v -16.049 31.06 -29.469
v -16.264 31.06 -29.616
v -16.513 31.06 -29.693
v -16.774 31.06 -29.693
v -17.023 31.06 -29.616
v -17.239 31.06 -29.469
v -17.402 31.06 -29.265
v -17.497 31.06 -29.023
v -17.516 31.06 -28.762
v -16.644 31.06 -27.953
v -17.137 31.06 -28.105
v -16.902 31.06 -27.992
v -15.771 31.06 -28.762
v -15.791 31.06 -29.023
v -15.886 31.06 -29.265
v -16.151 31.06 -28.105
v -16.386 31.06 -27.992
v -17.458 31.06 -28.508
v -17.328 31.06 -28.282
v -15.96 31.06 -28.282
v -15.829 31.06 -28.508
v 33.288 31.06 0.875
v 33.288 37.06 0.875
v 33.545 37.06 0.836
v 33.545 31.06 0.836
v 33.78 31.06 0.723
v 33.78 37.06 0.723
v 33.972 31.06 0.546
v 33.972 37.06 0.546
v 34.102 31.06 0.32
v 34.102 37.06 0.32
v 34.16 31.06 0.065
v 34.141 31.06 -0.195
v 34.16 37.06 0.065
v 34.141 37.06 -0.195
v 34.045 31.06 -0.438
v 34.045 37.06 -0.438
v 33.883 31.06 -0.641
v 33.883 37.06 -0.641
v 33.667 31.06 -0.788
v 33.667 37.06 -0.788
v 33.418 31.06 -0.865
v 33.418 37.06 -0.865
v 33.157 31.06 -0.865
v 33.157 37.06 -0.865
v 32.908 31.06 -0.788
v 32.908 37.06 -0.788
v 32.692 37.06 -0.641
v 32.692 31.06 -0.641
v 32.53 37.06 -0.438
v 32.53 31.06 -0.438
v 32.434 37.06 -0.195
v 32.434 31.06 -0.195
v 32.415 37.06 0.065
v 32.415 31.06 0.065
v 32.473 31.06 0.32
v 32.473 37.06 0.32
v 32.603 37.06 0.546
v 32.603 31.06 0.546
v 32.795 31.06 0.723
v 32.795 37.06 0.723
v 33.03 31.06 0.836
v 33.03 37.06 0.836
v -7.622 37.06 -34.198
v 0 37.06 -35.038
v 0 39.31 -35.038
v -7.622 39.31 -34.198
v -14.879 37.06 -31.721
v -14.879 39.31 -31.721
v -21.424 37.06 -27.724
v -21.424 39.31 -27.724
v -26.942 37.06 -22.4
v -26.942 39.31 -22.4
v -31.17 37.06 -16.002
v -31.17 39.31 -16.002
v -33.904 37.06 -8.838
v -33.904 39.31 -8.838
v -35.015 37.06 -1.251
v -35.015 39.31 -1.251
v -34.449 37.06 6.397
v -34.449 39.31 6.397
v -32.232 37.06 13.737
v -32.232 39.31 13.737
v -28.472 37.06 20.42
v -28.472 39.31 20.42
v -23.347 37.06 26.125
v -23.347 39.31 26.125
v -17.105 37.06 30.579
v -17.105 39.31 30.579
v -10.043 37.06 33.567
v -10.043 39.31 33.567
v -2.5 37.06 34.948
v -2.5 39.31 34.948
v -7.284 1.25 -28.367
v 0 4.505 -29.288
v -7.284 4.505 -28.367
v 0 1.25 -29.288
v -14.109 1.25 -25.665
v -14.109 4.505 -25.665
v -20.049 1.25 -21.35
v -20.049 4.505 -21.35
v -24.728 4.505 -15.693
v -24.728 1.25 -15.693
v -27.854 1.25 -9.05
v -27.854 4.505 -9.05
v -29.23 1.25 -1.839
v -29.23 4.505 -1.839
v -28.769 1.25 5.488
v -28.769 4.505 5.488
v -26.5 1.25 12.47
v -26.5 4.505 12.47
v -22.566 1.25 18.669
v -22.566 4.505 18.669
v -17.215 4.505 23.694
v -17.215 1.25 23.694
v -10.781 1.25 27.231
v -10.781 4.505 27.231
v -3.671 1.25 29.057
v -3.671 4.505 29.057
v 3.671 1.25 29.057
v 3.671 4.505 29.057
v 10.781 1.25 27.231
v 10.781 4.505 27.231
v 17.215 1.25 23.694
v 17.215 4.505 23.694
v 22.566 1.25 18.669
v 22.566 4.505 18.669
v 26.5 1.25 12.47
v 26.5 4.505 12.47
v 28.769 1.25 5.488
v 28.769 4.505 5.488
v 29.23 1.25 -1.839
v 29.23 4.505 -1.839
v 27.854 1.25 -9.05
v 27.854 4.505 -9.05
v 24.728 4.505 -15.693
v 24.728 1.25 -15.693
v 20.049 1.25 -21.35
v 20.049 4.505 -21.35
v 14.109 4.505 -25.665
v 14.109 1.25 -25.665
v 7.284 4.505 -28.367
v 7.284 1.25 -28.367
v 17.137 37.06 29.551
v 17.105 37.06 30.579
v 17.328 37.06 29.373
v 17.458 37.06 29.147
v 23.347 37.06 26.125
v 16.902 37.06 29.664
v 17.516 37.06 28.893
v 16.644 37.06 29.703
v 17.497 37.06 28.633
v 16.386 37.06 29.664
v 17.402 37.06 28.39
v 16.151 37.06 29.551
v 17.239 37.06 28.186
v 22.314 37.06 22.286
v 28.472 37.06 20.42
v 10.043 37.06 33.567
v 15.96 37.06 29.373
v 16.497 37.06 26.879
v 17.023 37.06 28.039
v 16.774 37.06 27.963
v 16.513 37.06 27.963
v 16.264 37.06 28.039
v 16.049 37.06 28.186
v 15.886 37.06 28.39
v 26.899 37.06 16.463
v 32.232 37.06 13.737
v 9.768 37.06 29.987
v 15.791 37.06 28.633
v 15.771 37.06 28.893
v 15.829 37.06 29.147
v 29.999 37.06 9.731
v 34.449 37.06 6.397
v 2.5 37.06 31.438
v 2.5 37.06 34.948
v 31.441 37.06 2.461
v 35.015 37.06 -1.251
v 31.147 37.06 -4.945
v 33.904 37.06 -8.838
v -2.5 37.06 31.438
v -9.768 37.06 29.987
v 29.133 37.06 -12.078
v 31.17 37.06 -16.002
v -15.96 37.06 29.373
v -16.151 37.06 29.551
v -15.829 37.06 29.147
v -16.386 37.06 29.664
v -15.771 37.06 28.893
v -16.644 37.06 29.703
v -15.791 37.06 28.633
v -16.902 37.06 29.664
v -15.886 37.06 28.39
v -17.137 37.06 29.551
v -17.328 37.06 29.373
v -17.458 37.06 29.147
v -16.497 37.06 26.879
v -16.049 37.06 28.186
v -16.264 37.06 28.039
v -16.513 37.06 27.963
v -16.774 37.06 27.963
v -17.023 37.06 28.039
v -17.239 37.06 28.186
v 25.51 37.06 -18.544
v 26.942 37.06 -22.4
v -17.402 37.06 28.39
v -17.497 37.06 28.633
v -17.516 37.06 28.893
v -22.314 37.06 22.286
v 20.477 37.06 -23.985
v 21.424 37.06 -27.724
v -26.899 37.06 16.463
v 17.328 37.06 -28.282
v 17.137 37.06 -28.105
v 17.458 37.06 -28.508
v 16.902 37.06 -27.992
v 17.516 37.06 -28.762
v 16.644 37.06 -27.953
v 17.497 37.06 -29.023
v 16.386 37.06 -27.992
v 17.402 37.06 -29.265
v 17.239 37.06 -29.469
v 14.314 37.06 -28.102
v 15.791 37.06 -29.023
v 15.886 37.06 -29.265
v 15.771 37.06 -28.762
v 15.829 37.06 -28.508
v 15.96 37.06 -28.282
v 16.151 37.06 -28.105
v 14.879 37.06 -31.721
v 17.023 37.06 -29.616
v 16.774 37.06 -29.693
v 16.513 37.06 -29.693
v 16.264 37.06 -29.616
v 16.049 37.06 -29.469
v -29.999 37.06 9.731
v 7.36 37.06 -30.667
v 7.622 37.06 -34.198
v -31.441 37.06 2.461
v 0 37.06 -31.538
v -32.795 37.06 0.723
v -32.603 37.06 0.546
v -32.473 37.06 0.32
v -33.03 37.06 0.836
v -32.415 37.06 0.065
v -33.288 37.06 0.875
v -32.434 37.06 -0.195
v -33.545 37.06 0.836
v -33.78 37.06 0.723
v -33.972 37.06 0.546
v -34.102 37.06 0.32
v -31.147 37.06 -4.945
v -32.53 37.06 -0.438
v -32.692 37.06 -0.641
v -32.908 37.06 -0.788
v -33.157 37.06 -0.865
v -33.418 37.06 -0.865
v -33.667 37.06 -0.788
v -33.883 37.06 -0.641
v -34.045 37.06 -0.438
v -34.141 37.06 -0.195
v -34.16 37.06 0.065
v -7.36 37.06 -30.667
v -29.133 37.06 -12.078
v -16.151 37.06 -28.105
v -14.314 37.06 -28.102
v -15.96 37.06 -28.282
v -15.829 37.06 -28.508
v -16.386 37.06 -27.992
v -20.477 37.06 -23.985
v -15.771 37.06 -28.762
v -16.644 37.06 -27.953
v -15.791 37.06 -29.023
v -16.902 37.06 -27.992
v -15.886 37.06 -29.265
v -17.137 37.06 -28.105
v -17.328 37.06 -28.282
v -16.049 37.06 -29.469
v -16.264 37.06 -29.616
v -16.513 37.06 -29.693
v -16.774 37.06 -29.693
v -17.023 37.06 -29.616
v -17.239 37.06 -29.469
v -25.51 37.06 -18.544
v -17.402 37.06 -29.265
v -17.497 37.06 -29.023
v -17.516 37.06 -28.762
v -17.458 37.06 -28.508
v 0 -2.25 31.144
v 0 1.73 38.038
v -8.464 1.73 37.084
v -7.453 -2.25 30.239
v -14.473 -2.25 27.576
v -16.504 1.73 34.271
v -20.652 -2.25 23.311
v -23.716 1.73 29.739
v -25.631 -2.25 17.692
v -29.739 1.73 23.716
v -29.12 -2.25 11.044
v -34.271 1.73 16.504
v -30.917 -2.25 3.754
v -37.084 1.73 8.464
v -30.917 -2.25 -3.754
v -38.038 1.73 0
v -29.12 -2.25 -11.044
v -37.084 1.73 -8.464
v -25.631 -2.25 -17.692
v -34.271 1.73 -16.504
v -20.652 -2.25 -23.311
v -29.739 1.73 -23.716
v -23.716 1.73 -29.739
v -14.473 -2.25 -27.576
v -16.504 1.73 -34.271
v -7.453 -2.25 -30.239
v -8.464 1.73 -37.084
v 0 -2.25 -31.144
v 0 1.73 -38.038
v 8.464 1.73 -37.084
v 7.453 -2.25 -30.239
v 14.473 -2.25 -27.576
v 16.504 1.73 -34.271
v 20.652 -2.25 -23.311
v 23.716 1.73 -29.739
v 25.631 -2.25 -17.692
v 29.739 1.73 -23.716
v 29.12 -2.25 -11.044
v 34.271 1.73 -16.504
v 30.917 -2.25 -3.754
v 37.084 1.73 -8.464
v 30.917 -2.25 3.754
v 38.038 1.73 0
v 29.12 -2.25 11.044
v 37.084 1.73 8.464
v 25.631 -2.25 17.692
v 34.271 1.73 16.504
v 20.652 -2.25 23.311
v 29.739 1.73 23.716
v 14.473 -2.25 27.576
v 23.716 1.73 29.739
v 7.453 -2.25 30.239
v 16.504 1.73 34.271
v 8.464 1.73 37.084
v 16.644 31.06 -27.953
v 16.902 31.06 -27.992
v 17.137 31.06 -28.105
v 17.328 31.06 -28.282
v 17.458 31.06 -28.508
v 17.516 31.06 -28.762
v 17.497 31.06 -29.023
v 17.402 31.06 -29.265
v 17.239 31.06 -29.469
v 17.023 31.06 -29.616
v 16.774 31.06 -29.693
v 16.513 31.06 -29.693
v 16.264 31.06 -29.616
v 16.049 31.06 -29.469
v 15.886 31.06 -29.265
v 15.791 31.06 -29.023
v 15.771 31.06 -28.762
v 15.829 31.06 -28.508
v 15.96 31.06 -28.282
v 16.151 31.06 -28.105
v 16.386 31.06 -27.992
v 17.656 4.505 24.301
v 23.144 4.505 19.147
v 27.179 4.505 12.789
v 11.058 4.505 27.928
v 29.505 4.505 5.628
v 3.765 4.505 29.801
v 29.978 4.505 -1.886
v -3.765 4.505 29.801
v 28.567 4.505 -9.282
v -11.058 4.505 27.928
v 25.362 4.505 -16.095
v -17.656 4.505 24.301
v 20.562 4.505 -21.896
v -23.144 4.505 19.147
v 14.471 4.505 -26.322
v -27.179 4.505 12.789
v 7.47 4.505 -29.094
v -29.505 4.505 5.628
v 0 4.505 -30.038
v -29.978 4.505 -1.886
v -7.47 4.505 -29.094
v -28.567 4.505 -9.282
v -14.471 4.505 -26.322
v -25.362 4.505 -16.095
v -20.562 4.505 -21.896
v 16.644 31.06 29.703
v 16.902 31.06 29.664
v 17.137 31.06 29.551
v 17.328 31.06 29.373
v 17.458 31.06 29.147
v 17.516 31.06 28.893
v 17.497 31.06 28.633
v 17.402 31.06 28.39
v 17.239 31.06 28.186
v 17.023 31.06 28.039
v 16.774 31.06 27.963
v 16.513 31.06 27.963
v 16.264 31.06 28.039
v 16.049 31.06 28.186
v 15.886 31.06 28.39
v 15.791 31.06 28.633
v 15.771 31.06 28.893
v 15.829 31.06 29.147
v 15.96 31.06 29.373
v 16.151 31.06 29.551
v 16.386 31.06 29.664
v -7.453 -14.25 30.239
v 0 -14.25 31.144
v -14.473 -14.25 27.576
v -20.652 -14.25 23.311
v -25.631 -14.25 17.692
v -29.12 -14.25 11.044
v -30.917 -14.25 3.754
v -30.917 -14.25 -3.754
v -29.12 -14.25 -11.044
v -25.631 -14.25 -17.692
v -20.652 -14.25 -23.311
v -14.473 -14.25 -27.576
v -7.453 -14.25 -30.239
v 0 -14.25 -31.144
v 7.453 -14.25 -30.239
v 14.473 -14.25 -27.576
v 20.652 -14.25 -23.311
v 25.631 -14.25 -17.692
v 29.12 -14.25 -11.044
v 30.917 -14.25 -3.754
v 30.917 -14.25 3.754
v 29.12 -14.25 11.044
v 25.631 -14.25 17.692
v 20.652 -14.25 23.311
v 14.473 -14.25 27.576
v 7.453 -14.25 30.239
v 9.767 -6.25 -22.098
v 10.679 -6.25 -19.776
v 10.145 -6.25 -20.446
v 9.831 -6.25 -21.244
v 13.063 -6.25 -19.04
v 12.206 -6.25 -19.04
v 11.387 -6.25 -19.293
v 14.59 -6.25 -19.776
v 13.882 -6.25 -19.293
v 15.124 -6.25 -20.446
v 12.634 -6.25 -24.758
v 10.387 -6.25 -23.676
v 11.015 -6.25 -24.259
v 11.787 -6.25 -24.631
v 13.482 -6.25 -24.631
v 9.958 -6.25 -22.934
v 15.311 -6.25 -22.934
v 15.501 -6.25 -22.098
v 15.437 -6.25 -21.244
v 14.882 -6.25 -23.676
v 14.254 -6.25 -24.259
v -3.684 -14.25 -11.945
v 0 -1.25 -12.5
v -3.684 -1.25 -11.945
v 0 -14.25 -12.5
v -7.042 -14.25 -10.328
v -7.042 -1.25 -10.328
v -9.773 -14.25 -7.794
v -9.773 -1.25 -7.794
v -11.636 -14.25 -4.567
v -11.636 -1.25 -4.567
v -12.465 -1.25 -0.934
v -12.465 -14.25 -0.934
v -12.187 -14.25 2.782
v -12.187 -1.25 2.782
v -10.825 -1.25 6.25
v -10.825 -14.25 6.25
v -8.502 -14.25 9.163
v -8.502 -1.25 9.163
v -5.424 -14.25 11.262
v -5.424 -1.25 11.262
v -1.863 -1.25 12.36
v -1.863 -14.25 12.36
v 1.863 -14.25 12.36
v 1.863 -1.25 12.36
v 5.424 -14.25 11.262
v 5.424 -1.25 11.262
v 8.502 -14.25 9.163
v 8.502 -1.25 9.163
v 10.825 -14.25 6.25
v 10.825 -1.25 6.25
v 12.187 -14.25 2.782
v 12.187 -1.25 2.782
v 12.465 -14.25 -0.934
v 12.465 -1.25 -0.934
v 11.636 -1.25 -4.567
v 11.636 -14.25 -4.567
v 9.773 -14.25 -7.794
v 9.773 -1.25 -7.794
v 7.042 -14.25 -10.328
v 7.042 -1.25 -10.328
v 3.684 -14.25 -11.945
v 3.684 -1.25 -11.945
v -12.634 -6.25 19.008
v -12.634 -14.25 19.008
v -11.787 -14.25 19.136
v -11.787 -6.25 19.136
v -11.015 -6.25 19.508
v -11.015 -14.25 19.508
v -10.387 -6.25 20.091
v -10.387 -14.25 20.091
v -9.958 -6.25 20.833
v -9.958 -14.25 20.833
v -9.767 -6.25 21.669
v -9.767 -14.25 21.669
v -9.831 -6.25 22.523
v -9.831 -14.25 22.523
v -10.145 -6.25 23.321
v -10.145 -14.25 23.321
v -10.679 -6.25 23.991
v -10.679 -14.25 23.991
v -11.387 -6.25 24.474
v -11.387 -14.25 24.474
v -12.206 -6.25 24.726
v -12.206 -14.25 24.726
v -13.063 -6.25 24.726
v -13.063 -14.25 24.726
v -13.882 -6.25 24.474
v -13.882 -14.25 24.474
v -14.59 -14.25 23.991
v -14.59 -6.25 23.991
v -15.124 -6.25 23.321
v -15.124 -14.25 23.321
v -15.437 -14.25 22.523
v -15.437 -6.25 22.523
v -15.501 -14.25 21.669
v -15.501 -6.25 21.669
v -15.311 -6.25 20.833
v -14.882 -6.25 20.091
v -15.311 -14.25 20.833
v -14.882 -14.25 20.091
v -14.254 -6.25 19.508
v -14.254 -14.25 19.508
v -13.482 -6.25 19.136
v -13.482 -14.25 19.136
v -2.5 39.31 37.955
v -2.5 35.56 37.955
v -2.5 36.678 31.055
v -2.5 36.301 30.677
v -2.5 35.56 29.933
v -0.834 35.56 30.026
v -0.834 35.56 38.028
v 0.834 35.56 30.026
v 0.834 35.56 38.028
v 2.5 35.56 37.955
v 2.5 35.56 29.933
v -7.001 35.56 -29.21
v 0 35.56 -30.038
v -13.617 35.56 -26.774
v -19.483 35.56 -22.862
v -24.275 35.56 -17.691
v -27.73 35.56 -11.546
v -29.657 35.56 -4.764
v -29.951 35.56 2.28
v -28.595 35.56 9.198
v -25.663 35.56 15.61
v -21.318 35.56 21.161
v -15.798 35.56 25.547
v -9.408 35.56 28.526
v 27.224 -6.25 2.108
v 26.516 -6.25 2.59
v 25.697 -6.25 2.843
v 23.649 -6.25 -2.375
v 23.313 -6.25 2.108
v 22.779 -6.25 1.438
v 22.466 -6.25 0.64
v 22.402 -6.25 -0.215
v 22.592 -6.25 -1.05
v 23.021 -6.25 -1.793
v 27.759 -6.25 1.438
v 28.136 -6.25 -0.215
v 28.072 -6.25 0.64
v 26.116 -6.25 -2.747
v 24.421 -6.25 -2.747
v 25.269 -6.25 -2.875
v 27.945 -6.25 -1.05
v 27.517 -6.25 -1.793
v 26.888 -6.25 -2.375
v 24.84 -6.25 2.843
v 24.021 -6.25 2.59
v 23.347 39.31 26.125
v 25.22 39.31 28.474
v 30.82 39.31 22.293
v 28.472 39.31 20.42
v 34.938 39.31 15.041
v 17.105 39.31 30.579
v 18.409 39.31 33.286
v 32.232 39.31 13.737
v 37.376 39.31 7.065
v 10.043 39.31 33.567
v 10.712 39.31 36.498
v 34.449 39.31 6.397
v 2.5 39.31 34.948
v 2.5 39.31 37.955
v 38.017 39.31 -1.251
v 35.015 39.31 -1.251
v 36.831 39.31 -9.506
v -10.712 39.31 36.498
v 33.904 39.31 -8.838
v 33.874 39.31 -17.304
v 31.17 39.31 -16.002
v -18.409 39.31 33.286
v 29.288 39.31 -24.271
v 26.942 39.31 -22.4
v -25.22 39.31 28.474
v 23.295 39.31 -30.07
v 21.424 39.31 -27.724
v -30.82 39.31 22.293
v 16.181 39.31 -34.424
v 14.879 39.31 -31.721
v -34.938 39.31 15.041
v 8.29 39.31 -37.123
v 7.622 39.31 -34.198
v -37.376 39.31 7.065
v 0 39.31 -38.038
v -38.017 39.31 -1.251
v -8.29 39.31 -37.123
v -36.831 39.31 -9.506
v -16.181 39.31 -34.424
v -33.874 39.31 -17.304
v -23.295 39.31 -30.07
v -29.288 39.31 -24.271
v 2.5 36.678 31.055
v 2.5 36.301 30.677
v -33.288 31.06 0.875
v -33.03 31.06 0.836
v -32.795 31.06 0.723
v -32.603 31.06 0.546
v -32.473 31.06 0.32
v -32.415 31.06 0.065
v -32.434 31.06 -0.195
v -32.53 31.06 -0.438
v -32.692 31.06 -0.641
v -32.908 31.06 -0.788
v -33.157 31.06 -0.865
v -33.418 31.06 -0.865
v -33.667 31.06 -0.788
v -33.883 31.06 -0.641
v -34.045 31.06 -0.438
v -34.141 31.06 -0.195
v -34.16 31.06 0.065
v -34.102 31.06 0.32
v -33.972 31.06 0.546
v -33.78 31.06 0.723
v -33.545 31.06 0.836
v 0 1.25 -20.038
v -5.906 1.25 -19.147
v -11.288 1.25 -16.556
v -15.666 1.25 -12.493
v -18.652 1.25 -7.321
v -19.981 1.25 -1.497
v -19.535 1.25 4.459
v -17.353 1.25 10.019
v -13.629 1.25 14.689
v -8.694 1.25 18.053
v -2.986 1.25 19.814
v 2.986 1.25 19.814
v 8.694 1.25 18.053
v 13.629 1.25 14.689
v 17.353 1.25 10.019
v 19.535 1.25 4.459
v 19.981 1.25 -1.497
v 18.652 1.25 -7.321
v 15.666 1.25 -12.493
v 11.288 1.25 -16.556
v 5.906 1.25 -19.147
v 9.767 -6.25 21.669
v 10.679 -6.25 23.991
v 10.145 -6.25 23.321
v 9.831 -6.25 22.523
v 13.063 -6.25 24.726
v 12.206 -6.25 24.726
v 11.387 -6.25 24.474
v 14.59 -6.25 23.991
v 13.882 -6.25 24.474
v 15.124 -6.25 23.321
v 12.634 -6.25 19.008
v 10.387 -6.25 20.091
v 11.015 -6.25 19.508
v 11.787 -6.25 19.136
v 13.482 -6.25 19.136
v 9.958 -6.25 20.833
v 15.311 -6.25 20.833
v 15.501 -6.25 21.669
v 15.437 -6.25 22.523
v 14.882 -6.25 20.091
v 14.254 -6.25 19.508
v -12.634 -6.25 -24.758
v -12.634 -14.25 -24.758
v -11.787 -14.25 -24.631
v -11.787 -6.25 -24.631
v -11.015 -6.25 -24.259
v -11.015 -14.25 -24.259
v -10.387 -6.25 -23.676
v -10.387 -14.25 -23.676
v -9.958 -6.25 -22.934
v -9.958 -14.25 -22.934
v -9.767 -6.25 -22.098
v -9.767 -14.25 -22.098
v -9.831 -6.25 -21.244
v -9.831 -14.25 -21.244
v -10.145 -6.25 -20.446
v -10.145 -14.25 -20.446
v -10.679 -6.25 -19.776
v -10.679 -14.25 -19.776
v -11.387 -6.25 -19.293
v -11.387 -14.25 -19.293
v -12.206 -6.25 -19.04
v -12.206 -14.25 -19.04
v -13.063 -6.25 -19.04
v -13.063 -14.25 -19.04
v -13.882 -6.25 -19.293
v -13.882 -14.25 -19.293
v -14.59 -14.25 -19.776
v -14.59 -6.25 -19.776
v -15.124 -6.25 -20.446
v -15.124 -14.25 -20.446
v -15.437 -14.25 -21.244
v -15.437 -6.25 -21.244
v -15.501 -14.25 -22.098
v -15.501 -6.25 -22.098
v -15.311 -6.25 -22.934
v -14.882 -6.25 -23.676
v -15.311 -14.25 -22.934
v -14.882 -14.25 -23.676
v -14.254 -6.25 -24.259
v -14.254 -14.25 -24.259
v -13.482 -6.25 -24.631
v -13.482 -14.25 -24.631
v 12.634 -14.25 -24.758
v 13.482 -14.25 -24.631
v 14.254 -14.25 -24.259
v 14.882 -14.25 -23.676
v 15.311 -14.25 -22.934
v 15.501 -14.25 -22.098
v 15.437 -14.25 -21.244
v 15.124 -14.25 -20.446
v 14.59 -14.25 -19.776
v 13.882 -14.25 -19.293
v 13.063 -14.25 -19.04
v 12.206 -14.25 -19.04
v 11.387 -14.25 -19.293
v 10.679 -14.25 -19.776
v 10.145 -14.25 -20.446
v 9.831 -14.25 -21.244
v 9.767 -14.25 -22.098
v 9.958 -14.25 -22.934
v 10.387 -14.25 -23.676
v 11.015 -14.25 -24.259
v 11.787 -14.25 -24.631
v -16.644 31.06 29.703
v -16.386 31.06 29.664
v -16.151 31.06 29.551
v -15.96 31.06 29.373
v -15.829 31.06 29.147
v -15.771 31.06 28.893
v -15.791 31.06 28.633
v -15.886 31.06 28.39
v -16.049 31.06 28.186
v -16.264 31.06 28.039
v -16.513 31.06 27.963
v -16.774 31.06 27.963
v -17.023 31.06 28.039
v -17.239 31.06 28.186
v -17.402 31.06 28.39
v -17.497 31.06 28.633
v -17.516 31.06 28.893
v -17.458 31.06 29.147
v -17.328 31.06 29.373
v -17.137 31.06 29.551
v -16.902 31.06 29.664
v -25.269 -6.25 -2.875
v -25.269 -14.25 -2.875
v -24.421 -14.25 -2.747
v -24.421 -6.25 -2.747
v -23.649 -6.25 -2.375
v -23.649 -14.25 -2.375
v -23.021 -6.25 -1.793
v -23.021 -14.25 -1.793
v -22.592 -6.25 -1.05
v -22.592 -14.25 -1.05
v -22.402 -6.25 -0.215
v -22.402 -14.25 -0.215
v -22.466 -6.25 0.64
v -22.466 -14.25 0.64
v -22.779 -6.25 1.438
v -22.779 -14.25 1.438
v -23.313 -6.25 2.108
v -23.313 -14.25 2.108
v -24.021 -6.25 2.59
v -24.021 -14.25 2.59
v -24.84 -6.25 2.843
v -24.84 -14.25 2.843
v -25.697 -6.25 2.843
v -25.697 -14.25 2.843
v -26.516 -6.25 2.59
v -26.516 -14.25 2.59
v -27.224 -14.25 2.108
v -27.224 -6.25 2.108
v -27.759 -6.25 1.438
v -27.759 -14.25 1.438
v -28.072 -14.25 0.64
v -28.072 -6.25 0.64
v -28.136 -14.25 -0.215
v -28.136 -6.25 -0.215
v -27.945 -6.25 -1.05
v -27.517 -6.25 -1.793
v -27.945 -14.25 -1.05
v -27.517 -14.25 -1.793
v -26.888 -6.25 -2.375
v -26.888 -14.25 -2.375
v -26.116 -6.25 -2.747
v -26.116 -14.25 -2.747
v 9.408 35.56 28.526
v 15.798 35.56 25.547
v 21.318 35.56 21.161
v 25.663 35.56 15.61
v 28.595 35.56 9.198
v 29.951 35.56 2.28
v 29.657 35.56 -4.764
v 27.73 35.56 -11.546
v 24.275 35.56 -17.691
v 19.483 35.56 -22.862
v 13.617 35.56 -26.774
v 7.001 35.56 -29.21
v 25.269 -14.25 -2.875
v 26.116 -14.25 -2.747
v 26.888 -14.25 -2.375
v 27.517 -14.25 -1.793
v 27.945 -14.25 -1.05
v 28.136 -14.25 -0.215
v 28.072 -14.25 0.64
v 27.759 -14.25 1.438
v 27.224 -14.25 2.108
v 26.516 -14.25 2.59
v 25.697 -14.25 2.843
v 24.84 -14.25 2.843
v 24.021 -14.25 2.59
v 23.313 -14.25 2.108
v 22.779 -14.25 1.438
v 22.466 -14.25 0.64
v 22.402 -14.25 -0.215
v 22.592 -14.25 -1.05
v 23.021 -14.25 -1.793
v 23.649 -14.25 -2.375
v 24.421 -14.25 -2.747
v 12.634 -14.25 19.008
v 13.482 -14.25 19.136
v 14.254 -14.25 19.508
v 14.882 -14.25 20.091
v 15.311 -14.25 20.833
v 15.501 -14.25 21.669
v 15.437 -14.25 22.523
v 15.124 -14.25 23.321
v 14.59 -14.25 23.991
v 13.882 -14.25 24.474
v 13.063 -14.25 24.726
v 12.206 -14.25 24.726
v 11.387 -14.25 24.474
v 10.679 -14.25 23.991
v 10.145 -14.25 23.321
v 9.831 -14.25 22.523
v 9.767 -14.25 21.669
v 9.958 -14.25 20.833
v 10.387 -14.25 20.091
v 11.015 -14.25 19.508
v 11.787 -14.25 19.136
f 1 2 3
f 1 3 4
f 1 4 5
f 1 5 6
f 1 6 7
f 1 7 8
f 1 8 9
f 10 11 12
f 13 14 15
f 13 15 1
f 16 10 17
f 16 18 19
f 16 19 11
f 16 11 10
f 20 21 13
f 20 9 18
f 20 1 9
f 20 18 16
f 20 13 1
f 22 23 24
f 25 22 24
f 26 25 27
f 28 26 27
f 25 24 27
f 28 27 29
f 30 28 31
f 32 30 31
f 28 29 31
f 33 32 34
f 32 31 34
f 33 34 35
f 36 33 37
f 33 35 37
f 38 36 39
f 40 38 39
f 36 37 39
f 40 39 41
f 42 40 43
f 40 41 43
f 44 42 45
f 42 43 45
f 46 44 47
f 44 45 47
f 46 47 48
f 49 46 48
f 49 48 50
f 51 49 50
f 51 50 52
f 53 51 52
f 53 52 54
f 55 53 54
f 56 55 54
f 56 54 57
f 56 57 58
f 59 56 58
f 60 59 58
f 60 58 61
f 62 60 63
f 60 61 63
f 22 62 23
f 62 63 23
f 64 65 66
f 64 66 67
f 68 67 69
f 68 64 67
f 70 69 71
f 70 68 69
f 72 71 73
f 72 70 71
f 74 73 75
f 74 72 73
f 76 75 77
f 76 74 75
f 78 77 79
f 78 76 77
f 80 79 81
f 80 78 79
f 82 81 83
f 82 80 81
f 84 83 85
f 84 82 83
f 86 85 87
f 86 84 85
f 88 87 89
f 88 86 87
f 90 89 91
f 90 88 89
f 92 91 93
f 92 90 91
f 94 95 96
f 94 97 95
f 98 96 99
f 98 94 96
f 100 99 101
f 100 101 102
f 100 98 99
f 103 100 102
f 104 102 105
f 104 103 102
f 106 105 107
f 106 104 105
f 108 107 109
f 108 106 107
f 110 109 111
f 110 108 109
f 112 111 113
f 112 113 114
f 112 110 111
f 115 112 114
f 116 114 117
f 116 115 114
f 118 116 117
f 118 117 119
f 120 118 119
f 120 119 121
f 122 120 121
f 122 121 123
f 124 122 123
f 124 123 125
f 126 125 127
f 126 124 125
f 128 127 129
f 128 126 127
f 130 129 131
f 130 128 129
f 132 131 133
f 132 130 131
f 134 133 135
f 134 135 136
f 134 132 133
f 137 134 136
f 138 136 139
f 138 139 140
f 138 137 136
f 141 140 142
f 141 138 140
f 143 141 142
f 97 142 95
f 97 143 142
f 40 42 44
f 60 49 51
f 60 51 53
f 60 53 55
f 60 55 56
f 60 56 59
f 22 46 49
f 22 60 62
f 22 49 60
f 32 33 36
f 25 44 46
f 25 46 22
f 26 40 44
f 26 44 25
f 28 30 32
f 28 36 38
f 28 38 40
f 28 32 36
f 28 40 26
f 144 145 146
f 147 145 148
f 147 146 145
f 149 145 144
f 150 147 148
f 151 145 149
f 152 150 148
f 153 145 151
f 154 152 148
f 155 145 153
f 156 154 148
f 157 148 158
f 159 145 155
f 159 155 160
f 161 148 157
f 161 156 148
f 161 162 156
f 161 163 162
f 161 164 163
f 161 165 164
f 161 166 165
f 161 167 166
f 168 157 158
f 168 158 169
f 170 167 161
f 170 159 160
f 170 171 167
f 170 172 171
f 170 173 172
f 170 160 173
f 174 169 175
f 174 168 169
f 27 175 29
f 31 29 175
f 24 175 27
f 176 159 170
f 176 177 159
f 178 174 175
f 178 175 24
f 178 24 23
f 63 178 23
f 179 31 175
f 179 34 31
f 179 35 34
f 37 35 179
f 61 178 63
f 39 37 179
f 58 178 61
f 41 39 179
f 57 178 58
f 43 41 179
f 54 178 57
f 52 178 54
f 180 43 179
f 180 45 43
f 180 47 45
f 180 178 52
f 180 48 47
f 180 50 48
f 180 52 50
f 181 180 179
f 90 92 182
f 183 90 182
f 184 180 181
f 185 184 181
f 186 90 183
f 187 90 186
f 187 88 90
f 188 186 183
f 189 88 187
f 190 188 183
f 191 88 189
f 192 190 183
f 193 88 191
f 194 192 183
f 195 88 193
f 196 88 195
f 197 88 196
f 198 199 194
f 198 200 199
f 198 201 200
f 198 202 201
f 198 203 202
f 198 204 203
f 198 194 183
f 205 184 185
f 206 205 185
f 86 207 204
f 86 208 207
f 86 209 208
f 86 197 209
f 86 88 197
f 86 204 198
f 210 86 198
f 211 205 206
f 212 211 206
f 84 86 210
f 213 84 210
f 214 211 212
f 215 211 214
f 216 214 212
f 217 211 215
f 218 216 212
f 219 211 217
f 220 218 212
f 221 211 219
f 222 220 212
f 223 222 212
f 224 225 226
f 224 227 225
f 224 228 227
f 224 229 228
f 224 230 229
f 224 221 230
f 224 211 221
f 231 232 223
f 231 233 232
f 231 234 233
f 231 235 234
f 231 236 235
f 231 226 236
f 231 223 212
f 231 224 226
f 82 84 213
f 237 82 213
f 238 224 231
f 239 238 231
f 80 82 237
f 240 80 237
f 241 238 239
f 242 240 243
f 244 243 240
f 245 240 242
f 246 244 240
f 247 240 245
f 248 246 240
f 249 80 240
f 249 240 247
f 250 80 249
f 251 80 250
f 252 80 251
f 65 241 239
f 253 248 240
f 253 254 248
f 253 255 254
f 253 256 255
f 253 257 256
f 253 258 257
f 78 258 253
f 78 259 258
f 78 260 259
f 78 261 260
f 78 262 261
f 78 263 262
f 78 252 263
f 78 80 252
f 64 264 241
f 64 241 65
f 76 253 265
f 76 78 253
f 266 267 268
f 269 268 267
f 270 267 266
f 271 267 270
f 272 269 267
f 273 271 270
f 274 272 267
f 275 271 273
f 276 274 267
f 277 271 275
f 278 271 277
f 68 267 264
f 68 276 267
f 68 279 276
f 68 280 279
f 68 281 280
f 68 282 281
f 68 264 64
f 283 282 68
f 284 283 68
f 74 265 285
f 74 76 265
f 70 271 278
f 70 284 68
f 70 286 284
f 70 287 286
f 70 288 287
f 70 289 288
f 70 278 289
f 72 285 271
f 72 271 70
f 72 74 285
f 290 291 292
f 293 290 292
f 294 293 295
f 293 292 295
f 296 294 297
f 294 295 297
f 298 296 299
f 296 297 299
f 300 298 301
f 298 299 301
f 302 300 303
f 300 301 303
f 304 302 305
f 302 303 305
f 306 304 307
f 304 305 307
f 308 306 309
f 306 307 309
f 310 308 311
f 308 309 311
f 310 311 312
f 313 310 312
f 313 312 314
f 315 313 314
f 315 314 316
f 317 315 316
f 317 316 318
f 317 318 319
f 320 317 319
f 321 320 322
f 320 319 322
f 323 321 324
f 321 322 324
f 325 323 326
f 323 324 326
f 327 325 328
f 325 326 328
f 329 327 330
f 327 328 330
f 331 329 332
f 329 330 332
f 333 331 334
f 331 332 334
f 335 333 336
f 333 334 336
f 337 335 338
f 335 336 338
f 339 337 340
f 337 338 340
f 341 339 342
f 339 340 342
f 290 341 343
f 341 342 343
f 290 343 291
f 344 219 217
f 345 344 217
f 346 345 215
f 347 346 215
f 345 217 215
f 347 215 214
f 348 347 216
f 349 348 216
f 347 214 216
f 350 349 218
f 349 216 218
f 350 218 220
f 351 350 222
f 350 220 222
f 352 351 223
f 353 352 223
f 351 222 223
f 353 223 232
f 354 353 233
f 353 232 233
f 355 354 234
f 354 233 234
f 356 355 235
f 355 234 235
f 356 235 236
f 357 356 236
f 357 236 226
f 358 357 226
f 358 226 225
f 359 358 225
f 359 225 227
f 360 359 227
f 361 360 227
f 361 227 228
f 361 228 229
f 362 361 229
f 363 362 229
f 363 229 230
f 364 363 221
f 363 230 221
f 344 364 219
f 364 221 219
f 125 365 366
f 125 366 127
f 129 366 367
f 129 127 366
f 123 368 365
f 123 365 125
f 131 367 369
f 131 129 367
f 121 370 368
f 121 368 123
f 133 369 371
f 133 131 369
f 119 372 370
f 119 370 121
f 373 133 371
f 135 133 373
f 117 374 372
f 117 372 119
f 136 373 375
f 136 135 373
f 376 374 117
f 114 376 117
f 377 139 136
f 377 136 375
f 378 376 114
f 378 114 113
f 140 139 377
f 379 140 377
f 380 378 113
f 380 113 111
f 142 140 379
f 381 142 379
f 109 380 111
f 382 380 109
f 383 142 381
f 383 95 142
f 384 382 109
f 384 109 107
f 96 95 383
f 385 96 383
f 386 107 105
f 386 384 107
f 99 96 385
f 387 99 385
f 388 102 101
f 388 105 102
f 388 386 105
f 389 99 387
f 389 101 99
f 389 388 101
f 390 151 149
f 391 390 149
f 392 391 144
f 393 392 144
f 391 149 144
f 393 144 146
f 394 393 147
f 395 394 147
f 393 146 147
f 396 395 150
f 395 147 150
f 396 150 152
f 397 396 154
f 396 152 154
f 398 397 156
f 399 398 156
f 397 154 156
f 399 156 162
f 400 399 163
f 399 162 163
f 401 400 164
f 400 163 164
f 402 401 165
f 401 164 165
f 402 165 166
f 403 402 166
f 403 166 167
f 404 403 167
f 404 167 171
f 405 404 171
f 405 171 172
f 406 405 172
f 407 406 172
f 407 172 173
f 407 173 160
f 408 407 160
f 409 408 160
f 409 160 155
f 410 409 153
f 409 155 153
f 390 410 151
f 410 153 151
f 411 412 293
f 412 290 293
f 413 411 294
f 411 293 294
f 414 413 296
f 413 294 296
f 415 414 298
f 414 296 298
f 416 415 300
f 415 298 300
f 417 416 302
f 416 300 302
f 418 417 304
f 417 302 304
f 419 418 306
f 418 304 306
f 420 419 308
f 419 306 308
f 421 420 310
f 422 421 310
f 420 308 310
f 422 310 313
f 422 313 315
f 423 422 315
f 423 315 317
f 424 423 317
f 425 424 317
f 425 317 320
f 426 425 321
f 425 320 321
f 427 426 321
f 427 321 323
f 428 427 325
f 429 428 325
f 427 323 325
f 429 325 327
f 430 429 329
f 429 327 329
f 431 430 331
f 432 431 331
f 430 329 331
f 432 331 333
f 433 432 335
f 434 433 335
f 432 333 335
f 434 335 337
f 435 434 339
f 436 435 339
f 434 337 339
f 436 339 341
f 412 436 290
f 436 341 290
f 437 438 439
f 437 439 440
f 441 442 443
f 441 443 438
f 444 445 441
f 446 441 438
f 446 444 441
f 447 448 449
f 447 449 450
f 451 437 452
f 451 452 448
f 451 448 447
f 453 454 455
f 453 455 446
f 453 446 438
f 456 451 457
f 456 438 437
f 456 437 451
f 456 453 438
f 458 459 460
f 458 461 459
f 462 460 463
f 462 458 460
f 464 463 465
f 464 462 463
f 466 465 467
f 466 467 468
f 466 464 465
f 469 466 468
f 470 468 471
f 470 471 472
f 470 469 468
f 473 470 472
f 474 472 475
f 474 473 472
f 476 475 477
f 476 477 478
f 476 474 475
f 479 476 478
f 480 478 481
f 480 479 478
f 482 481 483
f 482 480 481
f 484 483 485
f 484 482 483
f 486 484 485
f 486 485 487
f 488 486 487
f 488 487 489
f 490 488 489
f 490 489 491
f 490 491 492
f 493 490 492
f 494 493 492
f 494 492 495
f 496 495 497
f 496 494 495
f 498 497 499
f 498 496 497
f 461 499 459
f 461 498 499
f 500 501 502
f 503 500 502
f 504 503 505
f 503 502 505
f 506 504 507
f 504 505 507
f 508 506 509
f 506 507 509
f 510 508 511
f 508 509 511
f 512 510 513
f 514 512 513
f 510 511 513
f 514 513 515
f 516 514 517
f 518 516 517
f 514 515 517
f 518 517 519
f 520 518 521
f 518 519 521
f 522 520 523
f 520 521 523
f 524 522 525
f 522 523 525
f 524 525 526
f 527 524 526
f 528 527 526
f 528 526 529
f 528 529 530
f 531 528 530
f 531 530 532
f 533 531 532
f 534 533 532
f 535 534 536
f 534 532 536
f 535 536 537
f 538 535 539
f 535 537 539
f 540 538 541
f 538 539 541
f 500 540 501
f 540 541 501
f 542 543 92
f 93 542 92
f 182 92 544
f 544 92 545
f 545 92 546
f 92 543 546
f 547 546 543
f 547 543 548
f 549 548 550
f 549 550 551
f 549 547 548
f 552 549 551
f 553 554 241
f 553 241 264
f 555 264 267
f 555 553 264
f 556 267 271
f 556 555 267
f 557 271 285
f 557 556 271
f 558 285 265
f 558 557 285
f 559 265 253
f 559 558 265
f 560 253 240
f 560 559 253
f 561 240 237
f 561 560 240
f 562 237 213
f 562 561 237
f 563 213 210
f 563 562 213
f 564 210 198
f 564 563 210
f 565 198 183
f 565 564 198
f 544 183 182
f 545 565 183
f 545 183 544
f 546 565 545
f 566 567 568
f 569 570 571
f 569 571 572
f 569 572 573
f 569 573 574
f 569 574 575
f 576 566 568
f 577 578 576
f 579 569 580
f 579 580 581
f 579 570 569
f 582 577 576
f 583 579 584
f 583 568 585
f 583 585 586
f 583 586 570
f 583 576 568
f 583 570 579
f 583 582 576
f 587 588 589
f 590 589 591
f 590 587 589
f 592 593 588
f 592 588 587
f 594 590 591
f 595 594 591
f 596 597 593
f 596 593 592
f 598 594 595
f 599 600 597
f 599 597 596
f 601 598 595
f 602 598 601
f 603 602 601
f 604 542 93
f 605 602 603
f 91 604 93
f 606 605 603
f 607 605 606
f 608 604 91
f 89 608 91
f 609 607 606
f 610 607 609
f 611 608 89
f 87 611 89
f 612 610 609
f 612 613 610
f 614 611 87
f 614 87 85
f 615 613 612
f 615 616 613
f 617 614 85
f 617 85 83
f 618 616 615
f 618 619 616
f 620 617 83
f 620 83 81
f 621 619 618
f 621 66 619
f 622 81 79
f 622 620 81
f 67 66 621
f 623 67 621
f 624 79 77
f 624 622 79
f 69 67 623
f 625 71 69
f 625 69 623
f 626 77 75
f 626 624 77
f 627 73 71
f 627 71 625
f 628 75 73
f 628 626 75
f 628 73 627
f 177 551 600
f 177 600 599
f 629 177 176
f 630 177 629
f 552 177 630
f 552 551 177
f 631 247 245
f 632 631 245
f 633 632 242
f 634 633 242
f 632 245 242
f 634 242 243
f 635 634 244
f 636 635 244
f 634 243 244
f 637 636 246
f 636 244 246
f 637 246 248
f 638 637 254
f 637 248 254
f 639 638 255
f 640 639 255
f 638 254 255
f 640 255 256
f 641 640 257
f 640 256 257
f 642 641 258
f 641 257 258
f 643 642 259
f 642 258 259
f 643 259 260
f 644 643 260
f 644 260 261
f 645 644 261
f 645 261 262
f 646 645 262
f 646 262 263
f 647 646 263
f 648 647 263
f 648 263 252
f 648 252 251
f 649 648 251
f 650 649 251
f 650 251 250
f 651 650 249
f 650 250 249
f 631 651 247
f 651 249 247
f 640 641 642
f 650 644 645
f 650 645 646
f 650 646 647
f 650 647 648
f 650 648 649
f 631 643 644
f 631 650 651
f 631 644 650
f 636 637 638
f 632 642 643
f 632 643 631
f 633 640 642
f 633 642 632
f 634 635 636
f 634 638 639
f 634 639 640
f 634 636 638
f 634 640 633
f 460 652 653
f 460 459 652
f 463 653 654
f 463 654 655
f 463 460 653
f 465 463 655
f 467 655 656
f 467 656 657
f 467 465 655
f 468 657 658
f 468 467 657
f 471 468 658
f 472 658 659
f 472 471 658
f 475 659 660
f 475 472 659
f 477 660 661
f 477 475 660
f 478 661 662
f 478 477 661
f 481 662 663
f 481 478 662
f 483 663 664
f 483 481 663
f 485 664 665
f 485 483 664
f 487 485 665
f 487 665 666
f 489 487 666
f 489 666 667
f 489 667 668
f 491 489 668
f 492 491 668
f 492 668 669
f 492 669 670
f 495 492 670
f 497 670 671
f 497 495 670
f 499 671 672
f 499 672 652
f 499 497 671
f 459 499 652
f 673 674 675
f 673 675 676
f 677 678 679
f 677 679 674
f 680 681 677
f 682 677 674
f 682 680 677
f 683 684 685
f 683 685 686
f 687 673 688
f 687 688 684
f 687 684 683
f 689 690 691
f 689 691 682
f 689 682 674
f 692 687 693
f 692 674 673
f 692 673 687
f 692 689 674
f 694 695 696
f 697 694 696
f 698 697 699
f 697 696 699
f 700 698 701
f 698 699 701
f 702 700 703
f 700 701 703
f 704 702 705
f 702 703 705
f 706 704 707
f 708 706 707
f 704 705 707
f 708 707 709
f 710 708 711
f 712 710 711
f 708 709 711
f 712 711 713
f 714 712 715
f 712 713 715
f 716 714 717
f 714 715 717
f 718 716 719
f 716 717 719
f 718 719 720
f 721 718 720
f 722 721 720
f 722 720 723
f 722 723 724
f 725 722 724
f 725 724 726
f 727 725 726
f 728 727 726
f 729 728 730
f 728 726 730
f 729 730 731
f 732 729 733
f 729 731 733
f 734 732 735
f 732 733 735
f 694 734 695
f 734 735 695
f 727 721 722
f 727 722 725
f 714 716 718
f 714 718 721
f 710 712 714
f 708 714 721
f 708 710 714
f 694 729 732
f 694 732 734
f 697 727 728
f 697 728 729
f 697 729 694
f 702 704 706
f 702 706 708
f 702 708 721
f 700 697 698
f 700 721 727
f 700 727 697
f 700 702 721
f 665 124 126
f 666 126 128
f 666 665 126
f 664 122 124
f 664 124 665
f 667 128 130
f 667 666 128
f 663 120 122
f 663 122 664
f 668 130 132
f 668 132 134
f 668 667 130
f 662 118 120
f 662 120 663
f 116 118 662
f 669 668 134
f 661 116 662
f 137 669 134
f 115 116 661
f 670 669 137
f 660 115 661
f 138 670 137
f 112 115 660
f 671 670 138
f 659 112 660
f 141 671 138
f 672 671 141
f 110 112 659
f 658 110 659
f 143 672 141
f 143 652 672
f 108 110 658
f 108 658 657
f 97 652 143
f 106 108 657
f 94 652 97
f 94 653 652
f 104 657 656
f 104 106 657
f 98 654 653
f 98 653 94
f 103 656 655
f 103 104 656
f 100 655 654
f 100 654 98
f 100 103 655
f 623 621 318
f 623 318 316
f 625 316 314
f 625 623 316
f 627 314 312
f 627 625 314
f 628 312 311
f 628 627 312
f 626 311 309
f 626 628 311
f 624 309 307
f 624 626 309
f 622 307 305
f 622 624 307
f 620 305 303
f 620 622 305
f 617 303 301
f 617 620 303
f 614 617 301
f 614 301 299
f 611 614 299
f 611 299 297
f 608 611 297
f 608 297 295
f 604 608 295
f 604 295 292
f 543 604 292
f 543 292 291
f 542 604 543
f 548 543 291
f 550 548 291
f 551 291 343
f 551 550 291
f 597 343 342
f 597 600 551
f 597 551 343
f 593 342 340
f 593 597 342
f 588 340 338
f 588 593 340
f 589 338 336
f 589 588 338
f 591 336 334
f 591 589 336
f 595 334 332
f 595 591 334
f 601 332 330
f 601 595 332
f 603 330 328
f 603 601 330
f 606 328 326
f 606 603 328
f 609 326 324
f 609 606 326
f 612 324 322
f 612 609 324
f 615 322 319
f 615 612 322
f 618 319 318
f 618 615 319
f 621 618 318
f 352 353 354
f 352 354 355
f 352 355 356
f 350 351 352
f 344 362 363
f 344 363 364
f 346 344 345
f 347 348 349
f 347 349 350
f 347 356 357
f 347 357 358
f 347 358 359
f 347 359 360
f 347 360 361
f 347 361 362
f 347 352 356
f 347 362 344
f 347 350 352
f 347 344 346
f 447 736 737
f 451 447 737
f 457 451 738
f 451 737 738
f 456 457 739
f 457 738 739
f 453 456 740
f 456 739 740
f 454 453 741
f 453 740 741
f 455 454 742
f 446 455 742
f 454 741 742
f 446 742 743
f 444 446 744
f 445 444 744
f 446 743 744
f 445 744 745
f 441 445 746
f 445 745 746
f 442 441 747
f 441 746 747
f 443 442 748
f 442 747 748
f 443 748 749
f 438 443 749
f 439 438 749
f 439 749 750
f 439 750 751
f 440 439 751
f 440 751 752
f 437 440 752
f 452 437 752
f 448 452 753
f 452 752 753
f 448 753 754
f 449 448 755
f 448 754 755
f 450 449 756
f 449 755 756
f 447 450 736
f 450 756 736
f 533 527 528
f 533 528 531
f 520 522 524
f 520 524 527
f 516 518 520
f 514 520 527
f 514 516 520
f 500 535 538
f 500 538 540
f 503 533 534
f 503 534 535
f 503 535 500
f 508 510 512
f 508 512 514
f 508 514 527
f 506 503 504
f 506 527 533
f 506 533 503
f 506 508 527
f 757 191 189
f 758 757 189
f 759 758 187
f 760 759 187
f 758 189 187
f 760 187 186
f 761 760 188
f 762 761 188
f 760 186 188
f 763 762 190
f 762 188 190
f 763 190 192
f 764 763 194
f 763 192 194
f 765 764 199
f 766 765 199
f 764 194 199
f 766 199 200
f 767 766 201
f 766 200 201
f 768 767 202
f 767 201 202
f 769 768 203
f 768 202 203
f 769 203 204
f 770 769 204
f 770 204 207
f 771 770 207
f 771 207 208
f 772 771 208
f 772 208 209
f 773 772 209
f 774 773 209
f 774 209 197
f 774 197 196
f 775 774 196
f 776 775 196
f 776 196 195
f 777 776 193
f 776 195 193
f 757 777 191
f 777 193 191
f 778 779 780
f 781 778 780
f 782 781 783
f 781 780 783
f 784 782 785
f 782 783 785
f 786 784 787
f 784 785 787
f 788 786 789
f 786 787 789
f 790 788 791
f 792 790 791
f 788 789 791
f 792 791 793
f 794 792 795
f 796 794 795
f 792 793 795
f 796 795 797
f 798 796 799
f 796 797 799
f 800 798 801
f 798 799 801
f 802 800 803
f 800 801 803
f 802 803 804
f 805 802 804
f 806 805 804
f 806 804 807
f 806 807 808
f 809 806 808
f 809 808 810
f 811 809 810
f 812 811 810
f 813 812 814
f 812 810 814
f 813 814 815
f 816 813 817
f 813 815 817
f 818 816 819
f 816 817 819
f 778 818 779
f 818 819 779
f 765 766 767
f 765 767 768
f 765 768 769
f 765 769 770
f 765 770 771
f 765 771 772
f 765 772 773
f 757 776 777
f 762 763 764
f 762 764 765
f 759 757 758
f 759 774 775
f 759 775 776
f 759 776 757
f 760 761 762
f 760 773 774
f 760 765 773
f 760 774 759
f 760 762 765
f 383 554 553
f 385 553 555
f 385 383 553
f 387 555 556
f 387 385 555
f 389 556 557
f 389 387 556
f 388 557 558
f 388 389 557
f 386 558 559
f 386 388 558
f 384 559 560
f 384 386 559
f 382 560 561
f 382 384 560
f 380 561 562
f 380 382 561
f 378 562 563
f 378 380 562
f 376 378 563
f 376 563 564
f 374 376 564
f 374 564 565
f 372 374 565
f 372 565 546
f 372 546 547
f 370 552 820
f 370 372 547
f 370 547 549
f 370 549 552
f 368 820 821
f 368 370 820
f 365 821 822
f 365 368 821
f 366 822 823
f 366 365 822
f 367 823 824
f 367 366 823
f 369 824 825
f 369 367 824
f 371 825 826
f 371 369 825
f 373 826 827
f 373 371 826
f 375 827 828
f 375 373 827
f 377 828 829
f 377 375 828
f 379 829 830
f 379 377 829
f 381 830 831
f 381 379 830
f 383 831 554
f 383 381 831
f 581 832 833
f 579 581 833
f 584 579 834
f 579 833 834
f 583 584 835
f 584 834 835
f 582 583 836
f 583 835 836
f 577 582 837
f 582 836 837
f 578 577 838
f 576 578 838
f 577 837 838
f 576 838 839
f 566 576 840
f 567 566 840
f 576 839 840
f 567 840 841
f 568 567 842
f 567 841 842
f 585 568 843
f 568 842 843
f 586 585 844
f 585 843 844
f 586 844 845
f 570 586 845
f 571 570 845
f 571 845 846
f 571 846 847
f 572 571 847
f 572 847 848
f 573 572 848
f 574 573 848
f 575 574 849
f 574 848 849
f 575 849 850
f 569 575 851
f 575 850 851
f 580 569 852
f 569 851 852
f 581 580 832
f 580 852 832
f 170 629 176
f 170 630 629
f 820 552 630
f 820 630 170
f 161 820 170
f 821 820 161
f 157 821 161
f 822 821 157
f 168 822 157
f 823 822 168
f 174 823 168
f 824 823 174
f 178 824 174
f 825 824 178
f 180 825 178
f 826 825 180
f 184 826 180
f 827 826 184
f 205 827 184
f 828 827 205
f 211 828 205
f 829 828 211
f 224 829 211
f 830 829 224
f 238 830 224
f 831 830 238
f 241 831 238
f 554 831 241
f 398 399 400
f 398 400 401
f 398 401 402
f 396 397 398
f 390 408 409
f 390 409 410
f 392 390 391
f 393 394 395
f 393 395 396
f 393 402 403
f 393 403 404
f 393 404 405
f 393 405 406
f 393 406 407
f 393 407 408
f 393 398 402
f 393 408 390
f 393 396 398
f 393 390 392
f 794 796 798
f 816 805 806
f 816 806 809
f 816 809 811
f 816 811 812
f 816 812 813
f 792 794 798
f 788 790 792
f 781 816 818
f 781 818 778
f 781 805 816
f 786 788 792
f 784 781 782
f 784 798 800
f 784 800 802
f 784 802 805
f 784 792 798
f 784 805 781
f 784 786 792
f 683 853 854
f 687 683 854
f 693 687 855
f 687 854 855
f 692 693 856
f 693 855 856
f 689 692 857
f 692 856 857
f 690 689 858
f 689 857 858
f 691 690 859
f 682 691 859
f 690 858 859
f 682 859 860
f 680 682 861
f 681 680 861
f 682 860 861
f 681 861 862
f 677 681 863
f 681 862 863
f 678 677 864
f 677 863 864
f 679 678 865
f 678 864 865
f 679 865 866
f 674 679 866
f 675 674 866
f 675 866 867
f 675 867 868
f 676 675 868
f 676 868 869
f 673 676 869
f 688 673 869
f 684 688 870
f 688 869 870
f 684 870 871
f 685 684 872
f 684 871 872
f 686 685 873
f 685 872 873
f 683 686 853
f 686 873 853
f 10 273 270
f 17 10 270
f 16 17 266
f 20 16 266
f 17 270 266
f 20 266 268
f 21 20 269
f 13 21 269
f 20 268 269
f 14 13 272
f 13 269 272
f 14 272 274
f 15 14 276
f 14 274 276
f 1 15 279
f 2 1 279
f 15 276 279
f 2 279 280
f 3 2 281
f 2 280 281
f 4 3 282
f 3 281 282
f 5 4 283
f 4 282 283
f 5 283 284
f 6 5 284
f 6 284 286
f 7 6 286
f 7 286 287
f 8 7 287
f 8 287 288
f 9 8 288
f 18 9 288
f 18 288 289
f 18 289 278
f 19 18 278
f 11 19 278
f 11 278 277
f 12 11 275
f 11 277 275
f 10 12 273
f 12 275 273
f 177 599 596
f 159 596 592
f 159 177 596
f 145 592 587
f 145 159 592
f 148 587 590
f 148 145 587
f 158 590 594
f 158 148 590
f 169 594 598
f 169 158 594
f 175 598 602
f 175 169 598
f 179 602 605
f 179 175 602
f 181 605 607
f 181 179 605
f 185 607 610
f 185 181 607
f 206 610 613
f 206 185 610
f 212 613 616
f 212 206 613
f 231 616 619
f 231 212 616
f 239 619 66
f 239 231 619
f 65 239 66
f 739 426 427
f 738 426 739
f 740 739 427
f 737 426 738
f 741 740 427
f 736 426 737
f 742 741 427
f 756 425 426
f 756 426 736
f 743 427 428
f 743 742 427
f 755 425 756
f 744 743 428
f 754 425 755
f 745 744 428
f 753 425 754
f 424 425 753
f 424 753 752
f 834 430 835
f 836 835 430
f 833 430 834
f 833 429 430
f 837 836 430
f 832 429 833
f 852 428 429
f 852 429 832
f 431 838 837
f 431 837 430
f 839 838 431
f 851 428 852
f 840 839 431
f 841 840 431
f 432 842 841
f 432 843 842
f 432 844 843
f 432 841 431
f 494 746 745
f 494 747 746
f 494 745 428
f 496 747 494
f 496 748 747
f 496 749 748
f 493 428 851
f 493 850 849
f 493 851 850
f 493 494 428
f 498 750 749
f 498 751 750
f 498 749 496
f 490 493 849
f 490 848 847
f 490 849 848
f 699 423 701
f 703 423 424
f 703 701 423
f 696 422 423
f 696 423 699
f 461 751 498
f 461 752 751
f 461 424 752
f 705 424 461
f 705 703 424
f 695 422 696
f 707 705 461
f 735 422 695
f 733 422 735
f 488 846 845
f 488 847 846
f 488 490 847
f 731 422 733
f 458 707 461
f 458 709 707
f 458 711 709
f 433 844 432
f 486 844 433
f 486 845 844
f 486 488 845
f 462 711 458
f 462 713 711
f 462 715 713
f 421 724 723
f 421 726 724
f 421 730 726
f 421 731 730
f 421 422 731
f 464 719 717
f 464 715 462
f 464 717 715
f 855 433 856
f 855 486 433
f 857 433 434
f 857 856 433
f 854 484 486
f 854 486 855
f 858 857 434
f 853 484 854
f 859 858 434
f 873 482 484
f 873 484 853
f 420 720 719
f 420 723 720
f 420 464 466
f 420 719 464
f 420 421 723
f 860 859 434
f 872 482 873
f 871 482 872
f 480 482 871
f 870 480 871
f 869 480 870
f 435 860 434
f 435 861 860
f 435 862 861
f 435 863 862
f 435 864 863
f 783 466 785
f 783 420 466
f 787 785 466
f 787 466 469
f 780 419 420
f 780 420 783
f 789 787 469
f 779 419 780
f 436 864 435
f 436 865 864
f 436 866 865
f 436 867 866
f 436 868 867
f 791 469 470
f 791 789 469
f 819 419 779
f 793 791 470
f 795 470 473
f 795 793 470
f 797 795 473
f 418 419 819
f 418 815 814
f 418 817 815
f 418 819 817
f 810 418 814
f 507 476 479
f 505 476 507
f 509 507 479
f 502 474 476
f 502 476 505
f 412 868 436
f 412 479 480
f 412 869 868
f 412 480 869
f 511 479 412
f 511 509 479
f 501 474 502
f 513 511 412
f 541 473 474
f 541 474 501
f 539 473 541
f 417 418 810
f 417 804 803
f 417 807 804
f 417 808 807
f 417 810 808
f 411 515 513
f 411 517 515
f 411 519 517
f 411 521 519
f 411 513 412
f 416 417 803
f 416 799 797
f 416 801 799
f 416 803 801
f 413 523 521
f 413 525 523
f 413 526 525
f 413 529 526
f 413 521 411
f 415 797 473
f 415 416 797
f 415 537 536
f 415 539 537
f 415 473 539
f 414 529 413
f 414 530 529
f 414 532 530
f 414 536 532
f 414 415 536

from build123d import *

# Parameters (mm, degrees)
CHAMFER1_SIZE     = 1.5
WIRE_START        = -3.75
SKETCH8_W         = 5
SKETCH8_H         = 8.104217416
WIRE_HOLE_DEPTH   = 3.75
SKETCH9_R         = 0.875
FRONT_HOLES_DEPTH = 6
SKETCH10_R        = 2.875
BACK_HOLES_DEPTH  = 8


with BuildPart() as part:
    # Sketch7 → Base Motor Housing (revolve)
    with BuildSketch(Plane.XY, mode=Mode.PRIVATE) as base_motor_housing_sk:
        Polygon((-38.0375, 39.31), (-35.0375, 39.31), (-35.0375, 37.06), (-30.0375, 37.06), (-30.0375, 4.505), (-29.2875, 4.505), (-29.2875, 1.25), (-20.0375, 1.25), (-12.5, -1.25), (-12.5, -14.25), (-38.0375, -14.25), align=None)
    revolve(base_motor_housing_sk.sketch.rotate(Axis((0, -30.231871117, 0), (0, 1, 0)), 270), axis=Axis((0, -30.231871117, 0), (0, 1, 0)))

    # Chamfer1
    chamfer1_edges = [part.edges().sort_by_distance(p)[0] for p in [
        (0, 37.06, 30.0375),
    ]]
    chamfer(chamfer1_edges, length=CHAMFER1_SIZE)

    # Sketch8 → Wire Hole (cut)
    with BuildSketch(Plane(origin=(0, 39.31, 0), x_dir=(1, 0, 0), z_dir=(0, 1, 0)).offset(WIRE_START)):
        with Locations((0, -33.985391292)):
            Rectangle(SKETCH8_W, SKETCH8_H)
    extrude(amount=WIRE_HOLE_DEPTH, mode=Mode.SUBTRACT)

    # Sketch9 → Front-Holes (cut)
    with BuildSketch(Plane(origin=(0, 37.06, 0), x_dir=(1, 0, 0), z_dir=(0, 1, 0))):
        with Locations(Location((-33.2875, 0, 0), (0, 0, 270))):
            Circle(SKETCH9_R)
        with Locations(Location((-16.64375, 28.827820628, 0), (0, 0, 270))):
            Circle(SKETCH9_R)
        with Locations(Location((16.64375, 28.827820628, 0), (0, 0, 270))):
            Circle(SKETCH9_R)
        with Locations(Location((33.2875, 0, 0), (0, 0, 270))):
            Circle(SKETCH9_R)
        with Locations(Location((16.64375, -28.827820628, 0), (0, 0, 270))):
            Circle(SKETCH9_R)
        with Locations(Location((-16.64375, -28.827820628, 0), (0, 0, 270))):
            Circle(SKETCH9_R)
    extrude(amount=-FRONT_HOLES_DEPTH, mode=Mode.SUBTRACT)

    # Sketch10 → Back-Holes (cut)
    with BuildSketch(Plane.XZ.offset(14.25)):
        with Locations(Location((-25.26875, 0, 0), (0, 0, 270))):
            Circle(SKETCH10_R)
        with Locations(Location((-12.634375, 21.883379422, 0), (0, 0, 270))):
            Circle(SKETCH10_R)
        with Locations(Location((12.634375, 21.883379422, 0), (0, 0, 270))):
            Circle(SKETCH10_R)
        with Locations(Location((25.26875, 0, 0), (0, 0, 270))):
            Circle(SKETCH10_R)
        with Locations(Location((12.634375, -21.883379422, 0), (0, 0, 270))):
            Circle(SKETCH10_R)
        with Locations(Location((-12.634375, -21.883379422, 0), (0, 0, 270))):
            Circle(SKETCH10_R)
    extrude(amount=-BACK_HOLES_DEPTH, mode=Mode.SUBTRACT)

    # Sketch11 → Cut-Revolve1 (revolve, cut)
    with BuildSketch(Plane.XY, mode=Mode.PRIVATE) as cut_revolve1_sk:
        Polygon((31.14375, -14.25), (31.14375, -2.25), (38.0375, 1.730108418), (38.0375, -14.25), align=None)
    revolve(cut_revolve1_sk.sketch.rotate(Axis((0, 0, 0), (0, -1, 0)), 90), axis=Axis((0, 0, 0), (0, -1, 0)), mode=Mode.SUBTRACT)


solid = part.part
